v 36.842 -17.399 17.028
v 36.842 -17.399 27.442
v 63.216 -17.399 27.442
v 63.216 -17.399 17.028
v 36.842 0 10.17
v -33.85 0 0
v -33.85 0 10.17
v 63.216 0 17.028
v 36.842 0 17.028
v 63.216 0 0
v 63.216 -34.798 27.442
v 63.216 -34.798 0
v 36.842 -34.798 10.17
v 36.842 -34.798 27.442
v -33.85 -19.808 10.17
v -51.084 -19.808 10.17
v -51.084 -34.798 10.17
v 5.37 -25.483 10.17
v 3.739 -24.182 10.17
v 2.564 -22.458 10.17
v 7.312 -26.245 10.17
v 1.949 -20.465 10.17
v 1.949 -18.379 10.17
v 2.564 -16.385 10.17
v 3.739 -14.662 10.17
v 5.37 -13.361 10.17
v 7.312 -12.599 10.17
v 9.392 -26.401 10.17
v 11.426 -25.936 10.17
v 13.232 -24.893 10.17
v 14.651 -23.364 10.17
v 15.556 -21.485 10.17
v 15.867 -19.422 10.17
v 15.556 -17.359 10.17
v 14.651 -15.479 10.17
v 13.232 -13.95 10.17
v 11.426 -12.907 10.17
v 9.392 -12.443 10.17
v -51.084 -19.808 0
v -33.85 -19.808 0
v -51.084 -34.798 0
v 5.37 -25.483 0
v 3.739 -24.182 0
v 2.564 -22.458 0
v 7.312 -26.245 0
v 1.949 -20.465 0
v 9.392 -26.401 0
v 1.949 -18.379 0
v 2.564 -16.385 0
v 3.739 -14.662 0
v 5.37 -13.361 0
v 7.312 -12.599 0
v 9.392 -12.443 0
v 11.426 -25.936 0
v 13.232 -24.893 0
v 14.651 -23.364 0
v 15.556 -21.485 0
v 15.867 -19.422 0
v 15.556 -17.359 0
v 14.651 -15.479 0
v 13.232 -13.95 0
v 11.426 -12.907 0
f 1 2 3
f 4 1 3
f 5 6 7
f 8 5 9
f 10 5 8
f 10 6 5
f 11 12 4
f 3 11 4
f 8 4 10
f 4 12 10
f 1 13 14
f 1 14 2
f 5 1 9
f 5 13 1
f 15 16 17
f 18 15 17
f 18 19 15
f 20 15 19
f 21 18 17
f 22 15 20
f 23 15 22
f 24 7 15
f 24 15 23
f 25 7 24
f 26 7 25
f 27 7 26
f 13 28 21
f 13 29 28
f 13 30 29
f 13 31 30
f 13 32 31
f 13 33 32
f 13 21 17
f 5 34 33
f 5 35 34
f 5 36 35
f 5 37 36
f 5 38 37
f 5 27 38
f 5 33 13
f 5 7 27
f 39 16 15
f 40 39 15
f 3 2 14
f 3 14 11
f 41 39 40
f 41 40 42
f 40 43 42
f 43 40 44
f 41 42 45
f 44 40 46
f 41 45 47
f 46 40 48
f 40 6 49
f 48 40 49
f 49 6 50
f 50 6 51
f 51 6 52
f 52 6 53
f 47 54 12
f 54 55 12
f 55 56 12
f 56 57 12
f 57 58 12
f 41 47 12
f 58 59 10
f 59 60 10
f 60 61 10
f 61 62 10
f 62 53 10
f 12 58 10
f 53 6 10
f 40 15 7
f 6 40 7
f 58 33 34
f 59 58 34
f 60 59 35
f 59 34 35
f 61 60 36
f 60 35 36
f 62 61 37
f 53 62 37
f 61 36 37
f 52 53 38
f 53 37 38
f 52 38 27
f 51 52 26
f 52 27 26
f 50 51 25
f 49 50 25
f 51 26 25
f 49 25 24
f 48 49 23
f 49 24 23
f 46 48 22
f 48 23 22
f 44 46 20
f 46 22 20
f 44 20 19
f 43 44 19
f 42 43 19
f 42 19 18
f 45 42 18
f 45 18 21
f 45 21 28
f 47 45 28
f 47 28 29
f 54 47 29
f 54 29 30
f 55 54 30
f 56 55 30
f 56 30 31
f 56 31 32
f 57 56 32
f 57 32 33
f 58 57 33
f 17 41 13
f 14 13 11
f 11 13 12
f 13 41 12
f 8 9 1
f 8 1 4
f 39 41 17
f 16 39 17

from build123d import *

# Parameters (mm, degrees)
F0_W     = 114.3
F0_H     = 10.170036
F1_DEPTH = 34.798
F2_W     = 17.233886
F2_H     = 19.807858
F3_DEPTH = 25.4
F4_R     = 6.99841
F5_DEPTH = 25.4
F6_W     = 26.374524
F6_H     = 34.798
F7_DEPTH = 17.272
F8_W     = 26.374524
F8_H     = 17.399
F9_DEPTH = 10.414


with BuildPart() as f1:
    # F0 (on Front) → F1 (new body)
    with BuildSketch(Plane.XZ):
        with Locations((6.0662, 5.085018)):
            Rectangle(F0_W, F0_H)
    extrude(amount=F1_DEPTH)

    # F2 (on face) → F3 (cut)
    with BuildSketch(Plane.XY.offset(10.170036)):
        with Locations((-42.466857, -9.903929)):
            Rectangle(F2_W, F2_H)
    extrude(amount=-F3_DEPTH, mode=Mode.SUBTRACT)

    # F4 (on face) → F5 (cut)
    with BuildSketch(Plane.XY.offset(10.170036)):
        with Locations((8.868933, -19.421801)):
            Circle(F4_R)
    extrude(amount=-F5_DEPTH, mode=Mode.SUBTRACT)

    # F6 (on face) → F7 (join)
    with BuildSketch(Plane.XY.offset(10.170036)):
        with Locations((50.028938, -17.399)):
            Rectangle(F6_W, F6_H)
    extrude(amount=F7_DEPTH)

    # F8 (on face) → F9 (cut)
    with BuildSketch(Plane.XY.offset(27.442036)):
        with Locations((50.028938, -8.6995)):
            Rectangle(F8_W, F8_H)
    extrude(amount=-F9_DEPTH, mode=Mode.SUBTRACT)


solid = f1.part
